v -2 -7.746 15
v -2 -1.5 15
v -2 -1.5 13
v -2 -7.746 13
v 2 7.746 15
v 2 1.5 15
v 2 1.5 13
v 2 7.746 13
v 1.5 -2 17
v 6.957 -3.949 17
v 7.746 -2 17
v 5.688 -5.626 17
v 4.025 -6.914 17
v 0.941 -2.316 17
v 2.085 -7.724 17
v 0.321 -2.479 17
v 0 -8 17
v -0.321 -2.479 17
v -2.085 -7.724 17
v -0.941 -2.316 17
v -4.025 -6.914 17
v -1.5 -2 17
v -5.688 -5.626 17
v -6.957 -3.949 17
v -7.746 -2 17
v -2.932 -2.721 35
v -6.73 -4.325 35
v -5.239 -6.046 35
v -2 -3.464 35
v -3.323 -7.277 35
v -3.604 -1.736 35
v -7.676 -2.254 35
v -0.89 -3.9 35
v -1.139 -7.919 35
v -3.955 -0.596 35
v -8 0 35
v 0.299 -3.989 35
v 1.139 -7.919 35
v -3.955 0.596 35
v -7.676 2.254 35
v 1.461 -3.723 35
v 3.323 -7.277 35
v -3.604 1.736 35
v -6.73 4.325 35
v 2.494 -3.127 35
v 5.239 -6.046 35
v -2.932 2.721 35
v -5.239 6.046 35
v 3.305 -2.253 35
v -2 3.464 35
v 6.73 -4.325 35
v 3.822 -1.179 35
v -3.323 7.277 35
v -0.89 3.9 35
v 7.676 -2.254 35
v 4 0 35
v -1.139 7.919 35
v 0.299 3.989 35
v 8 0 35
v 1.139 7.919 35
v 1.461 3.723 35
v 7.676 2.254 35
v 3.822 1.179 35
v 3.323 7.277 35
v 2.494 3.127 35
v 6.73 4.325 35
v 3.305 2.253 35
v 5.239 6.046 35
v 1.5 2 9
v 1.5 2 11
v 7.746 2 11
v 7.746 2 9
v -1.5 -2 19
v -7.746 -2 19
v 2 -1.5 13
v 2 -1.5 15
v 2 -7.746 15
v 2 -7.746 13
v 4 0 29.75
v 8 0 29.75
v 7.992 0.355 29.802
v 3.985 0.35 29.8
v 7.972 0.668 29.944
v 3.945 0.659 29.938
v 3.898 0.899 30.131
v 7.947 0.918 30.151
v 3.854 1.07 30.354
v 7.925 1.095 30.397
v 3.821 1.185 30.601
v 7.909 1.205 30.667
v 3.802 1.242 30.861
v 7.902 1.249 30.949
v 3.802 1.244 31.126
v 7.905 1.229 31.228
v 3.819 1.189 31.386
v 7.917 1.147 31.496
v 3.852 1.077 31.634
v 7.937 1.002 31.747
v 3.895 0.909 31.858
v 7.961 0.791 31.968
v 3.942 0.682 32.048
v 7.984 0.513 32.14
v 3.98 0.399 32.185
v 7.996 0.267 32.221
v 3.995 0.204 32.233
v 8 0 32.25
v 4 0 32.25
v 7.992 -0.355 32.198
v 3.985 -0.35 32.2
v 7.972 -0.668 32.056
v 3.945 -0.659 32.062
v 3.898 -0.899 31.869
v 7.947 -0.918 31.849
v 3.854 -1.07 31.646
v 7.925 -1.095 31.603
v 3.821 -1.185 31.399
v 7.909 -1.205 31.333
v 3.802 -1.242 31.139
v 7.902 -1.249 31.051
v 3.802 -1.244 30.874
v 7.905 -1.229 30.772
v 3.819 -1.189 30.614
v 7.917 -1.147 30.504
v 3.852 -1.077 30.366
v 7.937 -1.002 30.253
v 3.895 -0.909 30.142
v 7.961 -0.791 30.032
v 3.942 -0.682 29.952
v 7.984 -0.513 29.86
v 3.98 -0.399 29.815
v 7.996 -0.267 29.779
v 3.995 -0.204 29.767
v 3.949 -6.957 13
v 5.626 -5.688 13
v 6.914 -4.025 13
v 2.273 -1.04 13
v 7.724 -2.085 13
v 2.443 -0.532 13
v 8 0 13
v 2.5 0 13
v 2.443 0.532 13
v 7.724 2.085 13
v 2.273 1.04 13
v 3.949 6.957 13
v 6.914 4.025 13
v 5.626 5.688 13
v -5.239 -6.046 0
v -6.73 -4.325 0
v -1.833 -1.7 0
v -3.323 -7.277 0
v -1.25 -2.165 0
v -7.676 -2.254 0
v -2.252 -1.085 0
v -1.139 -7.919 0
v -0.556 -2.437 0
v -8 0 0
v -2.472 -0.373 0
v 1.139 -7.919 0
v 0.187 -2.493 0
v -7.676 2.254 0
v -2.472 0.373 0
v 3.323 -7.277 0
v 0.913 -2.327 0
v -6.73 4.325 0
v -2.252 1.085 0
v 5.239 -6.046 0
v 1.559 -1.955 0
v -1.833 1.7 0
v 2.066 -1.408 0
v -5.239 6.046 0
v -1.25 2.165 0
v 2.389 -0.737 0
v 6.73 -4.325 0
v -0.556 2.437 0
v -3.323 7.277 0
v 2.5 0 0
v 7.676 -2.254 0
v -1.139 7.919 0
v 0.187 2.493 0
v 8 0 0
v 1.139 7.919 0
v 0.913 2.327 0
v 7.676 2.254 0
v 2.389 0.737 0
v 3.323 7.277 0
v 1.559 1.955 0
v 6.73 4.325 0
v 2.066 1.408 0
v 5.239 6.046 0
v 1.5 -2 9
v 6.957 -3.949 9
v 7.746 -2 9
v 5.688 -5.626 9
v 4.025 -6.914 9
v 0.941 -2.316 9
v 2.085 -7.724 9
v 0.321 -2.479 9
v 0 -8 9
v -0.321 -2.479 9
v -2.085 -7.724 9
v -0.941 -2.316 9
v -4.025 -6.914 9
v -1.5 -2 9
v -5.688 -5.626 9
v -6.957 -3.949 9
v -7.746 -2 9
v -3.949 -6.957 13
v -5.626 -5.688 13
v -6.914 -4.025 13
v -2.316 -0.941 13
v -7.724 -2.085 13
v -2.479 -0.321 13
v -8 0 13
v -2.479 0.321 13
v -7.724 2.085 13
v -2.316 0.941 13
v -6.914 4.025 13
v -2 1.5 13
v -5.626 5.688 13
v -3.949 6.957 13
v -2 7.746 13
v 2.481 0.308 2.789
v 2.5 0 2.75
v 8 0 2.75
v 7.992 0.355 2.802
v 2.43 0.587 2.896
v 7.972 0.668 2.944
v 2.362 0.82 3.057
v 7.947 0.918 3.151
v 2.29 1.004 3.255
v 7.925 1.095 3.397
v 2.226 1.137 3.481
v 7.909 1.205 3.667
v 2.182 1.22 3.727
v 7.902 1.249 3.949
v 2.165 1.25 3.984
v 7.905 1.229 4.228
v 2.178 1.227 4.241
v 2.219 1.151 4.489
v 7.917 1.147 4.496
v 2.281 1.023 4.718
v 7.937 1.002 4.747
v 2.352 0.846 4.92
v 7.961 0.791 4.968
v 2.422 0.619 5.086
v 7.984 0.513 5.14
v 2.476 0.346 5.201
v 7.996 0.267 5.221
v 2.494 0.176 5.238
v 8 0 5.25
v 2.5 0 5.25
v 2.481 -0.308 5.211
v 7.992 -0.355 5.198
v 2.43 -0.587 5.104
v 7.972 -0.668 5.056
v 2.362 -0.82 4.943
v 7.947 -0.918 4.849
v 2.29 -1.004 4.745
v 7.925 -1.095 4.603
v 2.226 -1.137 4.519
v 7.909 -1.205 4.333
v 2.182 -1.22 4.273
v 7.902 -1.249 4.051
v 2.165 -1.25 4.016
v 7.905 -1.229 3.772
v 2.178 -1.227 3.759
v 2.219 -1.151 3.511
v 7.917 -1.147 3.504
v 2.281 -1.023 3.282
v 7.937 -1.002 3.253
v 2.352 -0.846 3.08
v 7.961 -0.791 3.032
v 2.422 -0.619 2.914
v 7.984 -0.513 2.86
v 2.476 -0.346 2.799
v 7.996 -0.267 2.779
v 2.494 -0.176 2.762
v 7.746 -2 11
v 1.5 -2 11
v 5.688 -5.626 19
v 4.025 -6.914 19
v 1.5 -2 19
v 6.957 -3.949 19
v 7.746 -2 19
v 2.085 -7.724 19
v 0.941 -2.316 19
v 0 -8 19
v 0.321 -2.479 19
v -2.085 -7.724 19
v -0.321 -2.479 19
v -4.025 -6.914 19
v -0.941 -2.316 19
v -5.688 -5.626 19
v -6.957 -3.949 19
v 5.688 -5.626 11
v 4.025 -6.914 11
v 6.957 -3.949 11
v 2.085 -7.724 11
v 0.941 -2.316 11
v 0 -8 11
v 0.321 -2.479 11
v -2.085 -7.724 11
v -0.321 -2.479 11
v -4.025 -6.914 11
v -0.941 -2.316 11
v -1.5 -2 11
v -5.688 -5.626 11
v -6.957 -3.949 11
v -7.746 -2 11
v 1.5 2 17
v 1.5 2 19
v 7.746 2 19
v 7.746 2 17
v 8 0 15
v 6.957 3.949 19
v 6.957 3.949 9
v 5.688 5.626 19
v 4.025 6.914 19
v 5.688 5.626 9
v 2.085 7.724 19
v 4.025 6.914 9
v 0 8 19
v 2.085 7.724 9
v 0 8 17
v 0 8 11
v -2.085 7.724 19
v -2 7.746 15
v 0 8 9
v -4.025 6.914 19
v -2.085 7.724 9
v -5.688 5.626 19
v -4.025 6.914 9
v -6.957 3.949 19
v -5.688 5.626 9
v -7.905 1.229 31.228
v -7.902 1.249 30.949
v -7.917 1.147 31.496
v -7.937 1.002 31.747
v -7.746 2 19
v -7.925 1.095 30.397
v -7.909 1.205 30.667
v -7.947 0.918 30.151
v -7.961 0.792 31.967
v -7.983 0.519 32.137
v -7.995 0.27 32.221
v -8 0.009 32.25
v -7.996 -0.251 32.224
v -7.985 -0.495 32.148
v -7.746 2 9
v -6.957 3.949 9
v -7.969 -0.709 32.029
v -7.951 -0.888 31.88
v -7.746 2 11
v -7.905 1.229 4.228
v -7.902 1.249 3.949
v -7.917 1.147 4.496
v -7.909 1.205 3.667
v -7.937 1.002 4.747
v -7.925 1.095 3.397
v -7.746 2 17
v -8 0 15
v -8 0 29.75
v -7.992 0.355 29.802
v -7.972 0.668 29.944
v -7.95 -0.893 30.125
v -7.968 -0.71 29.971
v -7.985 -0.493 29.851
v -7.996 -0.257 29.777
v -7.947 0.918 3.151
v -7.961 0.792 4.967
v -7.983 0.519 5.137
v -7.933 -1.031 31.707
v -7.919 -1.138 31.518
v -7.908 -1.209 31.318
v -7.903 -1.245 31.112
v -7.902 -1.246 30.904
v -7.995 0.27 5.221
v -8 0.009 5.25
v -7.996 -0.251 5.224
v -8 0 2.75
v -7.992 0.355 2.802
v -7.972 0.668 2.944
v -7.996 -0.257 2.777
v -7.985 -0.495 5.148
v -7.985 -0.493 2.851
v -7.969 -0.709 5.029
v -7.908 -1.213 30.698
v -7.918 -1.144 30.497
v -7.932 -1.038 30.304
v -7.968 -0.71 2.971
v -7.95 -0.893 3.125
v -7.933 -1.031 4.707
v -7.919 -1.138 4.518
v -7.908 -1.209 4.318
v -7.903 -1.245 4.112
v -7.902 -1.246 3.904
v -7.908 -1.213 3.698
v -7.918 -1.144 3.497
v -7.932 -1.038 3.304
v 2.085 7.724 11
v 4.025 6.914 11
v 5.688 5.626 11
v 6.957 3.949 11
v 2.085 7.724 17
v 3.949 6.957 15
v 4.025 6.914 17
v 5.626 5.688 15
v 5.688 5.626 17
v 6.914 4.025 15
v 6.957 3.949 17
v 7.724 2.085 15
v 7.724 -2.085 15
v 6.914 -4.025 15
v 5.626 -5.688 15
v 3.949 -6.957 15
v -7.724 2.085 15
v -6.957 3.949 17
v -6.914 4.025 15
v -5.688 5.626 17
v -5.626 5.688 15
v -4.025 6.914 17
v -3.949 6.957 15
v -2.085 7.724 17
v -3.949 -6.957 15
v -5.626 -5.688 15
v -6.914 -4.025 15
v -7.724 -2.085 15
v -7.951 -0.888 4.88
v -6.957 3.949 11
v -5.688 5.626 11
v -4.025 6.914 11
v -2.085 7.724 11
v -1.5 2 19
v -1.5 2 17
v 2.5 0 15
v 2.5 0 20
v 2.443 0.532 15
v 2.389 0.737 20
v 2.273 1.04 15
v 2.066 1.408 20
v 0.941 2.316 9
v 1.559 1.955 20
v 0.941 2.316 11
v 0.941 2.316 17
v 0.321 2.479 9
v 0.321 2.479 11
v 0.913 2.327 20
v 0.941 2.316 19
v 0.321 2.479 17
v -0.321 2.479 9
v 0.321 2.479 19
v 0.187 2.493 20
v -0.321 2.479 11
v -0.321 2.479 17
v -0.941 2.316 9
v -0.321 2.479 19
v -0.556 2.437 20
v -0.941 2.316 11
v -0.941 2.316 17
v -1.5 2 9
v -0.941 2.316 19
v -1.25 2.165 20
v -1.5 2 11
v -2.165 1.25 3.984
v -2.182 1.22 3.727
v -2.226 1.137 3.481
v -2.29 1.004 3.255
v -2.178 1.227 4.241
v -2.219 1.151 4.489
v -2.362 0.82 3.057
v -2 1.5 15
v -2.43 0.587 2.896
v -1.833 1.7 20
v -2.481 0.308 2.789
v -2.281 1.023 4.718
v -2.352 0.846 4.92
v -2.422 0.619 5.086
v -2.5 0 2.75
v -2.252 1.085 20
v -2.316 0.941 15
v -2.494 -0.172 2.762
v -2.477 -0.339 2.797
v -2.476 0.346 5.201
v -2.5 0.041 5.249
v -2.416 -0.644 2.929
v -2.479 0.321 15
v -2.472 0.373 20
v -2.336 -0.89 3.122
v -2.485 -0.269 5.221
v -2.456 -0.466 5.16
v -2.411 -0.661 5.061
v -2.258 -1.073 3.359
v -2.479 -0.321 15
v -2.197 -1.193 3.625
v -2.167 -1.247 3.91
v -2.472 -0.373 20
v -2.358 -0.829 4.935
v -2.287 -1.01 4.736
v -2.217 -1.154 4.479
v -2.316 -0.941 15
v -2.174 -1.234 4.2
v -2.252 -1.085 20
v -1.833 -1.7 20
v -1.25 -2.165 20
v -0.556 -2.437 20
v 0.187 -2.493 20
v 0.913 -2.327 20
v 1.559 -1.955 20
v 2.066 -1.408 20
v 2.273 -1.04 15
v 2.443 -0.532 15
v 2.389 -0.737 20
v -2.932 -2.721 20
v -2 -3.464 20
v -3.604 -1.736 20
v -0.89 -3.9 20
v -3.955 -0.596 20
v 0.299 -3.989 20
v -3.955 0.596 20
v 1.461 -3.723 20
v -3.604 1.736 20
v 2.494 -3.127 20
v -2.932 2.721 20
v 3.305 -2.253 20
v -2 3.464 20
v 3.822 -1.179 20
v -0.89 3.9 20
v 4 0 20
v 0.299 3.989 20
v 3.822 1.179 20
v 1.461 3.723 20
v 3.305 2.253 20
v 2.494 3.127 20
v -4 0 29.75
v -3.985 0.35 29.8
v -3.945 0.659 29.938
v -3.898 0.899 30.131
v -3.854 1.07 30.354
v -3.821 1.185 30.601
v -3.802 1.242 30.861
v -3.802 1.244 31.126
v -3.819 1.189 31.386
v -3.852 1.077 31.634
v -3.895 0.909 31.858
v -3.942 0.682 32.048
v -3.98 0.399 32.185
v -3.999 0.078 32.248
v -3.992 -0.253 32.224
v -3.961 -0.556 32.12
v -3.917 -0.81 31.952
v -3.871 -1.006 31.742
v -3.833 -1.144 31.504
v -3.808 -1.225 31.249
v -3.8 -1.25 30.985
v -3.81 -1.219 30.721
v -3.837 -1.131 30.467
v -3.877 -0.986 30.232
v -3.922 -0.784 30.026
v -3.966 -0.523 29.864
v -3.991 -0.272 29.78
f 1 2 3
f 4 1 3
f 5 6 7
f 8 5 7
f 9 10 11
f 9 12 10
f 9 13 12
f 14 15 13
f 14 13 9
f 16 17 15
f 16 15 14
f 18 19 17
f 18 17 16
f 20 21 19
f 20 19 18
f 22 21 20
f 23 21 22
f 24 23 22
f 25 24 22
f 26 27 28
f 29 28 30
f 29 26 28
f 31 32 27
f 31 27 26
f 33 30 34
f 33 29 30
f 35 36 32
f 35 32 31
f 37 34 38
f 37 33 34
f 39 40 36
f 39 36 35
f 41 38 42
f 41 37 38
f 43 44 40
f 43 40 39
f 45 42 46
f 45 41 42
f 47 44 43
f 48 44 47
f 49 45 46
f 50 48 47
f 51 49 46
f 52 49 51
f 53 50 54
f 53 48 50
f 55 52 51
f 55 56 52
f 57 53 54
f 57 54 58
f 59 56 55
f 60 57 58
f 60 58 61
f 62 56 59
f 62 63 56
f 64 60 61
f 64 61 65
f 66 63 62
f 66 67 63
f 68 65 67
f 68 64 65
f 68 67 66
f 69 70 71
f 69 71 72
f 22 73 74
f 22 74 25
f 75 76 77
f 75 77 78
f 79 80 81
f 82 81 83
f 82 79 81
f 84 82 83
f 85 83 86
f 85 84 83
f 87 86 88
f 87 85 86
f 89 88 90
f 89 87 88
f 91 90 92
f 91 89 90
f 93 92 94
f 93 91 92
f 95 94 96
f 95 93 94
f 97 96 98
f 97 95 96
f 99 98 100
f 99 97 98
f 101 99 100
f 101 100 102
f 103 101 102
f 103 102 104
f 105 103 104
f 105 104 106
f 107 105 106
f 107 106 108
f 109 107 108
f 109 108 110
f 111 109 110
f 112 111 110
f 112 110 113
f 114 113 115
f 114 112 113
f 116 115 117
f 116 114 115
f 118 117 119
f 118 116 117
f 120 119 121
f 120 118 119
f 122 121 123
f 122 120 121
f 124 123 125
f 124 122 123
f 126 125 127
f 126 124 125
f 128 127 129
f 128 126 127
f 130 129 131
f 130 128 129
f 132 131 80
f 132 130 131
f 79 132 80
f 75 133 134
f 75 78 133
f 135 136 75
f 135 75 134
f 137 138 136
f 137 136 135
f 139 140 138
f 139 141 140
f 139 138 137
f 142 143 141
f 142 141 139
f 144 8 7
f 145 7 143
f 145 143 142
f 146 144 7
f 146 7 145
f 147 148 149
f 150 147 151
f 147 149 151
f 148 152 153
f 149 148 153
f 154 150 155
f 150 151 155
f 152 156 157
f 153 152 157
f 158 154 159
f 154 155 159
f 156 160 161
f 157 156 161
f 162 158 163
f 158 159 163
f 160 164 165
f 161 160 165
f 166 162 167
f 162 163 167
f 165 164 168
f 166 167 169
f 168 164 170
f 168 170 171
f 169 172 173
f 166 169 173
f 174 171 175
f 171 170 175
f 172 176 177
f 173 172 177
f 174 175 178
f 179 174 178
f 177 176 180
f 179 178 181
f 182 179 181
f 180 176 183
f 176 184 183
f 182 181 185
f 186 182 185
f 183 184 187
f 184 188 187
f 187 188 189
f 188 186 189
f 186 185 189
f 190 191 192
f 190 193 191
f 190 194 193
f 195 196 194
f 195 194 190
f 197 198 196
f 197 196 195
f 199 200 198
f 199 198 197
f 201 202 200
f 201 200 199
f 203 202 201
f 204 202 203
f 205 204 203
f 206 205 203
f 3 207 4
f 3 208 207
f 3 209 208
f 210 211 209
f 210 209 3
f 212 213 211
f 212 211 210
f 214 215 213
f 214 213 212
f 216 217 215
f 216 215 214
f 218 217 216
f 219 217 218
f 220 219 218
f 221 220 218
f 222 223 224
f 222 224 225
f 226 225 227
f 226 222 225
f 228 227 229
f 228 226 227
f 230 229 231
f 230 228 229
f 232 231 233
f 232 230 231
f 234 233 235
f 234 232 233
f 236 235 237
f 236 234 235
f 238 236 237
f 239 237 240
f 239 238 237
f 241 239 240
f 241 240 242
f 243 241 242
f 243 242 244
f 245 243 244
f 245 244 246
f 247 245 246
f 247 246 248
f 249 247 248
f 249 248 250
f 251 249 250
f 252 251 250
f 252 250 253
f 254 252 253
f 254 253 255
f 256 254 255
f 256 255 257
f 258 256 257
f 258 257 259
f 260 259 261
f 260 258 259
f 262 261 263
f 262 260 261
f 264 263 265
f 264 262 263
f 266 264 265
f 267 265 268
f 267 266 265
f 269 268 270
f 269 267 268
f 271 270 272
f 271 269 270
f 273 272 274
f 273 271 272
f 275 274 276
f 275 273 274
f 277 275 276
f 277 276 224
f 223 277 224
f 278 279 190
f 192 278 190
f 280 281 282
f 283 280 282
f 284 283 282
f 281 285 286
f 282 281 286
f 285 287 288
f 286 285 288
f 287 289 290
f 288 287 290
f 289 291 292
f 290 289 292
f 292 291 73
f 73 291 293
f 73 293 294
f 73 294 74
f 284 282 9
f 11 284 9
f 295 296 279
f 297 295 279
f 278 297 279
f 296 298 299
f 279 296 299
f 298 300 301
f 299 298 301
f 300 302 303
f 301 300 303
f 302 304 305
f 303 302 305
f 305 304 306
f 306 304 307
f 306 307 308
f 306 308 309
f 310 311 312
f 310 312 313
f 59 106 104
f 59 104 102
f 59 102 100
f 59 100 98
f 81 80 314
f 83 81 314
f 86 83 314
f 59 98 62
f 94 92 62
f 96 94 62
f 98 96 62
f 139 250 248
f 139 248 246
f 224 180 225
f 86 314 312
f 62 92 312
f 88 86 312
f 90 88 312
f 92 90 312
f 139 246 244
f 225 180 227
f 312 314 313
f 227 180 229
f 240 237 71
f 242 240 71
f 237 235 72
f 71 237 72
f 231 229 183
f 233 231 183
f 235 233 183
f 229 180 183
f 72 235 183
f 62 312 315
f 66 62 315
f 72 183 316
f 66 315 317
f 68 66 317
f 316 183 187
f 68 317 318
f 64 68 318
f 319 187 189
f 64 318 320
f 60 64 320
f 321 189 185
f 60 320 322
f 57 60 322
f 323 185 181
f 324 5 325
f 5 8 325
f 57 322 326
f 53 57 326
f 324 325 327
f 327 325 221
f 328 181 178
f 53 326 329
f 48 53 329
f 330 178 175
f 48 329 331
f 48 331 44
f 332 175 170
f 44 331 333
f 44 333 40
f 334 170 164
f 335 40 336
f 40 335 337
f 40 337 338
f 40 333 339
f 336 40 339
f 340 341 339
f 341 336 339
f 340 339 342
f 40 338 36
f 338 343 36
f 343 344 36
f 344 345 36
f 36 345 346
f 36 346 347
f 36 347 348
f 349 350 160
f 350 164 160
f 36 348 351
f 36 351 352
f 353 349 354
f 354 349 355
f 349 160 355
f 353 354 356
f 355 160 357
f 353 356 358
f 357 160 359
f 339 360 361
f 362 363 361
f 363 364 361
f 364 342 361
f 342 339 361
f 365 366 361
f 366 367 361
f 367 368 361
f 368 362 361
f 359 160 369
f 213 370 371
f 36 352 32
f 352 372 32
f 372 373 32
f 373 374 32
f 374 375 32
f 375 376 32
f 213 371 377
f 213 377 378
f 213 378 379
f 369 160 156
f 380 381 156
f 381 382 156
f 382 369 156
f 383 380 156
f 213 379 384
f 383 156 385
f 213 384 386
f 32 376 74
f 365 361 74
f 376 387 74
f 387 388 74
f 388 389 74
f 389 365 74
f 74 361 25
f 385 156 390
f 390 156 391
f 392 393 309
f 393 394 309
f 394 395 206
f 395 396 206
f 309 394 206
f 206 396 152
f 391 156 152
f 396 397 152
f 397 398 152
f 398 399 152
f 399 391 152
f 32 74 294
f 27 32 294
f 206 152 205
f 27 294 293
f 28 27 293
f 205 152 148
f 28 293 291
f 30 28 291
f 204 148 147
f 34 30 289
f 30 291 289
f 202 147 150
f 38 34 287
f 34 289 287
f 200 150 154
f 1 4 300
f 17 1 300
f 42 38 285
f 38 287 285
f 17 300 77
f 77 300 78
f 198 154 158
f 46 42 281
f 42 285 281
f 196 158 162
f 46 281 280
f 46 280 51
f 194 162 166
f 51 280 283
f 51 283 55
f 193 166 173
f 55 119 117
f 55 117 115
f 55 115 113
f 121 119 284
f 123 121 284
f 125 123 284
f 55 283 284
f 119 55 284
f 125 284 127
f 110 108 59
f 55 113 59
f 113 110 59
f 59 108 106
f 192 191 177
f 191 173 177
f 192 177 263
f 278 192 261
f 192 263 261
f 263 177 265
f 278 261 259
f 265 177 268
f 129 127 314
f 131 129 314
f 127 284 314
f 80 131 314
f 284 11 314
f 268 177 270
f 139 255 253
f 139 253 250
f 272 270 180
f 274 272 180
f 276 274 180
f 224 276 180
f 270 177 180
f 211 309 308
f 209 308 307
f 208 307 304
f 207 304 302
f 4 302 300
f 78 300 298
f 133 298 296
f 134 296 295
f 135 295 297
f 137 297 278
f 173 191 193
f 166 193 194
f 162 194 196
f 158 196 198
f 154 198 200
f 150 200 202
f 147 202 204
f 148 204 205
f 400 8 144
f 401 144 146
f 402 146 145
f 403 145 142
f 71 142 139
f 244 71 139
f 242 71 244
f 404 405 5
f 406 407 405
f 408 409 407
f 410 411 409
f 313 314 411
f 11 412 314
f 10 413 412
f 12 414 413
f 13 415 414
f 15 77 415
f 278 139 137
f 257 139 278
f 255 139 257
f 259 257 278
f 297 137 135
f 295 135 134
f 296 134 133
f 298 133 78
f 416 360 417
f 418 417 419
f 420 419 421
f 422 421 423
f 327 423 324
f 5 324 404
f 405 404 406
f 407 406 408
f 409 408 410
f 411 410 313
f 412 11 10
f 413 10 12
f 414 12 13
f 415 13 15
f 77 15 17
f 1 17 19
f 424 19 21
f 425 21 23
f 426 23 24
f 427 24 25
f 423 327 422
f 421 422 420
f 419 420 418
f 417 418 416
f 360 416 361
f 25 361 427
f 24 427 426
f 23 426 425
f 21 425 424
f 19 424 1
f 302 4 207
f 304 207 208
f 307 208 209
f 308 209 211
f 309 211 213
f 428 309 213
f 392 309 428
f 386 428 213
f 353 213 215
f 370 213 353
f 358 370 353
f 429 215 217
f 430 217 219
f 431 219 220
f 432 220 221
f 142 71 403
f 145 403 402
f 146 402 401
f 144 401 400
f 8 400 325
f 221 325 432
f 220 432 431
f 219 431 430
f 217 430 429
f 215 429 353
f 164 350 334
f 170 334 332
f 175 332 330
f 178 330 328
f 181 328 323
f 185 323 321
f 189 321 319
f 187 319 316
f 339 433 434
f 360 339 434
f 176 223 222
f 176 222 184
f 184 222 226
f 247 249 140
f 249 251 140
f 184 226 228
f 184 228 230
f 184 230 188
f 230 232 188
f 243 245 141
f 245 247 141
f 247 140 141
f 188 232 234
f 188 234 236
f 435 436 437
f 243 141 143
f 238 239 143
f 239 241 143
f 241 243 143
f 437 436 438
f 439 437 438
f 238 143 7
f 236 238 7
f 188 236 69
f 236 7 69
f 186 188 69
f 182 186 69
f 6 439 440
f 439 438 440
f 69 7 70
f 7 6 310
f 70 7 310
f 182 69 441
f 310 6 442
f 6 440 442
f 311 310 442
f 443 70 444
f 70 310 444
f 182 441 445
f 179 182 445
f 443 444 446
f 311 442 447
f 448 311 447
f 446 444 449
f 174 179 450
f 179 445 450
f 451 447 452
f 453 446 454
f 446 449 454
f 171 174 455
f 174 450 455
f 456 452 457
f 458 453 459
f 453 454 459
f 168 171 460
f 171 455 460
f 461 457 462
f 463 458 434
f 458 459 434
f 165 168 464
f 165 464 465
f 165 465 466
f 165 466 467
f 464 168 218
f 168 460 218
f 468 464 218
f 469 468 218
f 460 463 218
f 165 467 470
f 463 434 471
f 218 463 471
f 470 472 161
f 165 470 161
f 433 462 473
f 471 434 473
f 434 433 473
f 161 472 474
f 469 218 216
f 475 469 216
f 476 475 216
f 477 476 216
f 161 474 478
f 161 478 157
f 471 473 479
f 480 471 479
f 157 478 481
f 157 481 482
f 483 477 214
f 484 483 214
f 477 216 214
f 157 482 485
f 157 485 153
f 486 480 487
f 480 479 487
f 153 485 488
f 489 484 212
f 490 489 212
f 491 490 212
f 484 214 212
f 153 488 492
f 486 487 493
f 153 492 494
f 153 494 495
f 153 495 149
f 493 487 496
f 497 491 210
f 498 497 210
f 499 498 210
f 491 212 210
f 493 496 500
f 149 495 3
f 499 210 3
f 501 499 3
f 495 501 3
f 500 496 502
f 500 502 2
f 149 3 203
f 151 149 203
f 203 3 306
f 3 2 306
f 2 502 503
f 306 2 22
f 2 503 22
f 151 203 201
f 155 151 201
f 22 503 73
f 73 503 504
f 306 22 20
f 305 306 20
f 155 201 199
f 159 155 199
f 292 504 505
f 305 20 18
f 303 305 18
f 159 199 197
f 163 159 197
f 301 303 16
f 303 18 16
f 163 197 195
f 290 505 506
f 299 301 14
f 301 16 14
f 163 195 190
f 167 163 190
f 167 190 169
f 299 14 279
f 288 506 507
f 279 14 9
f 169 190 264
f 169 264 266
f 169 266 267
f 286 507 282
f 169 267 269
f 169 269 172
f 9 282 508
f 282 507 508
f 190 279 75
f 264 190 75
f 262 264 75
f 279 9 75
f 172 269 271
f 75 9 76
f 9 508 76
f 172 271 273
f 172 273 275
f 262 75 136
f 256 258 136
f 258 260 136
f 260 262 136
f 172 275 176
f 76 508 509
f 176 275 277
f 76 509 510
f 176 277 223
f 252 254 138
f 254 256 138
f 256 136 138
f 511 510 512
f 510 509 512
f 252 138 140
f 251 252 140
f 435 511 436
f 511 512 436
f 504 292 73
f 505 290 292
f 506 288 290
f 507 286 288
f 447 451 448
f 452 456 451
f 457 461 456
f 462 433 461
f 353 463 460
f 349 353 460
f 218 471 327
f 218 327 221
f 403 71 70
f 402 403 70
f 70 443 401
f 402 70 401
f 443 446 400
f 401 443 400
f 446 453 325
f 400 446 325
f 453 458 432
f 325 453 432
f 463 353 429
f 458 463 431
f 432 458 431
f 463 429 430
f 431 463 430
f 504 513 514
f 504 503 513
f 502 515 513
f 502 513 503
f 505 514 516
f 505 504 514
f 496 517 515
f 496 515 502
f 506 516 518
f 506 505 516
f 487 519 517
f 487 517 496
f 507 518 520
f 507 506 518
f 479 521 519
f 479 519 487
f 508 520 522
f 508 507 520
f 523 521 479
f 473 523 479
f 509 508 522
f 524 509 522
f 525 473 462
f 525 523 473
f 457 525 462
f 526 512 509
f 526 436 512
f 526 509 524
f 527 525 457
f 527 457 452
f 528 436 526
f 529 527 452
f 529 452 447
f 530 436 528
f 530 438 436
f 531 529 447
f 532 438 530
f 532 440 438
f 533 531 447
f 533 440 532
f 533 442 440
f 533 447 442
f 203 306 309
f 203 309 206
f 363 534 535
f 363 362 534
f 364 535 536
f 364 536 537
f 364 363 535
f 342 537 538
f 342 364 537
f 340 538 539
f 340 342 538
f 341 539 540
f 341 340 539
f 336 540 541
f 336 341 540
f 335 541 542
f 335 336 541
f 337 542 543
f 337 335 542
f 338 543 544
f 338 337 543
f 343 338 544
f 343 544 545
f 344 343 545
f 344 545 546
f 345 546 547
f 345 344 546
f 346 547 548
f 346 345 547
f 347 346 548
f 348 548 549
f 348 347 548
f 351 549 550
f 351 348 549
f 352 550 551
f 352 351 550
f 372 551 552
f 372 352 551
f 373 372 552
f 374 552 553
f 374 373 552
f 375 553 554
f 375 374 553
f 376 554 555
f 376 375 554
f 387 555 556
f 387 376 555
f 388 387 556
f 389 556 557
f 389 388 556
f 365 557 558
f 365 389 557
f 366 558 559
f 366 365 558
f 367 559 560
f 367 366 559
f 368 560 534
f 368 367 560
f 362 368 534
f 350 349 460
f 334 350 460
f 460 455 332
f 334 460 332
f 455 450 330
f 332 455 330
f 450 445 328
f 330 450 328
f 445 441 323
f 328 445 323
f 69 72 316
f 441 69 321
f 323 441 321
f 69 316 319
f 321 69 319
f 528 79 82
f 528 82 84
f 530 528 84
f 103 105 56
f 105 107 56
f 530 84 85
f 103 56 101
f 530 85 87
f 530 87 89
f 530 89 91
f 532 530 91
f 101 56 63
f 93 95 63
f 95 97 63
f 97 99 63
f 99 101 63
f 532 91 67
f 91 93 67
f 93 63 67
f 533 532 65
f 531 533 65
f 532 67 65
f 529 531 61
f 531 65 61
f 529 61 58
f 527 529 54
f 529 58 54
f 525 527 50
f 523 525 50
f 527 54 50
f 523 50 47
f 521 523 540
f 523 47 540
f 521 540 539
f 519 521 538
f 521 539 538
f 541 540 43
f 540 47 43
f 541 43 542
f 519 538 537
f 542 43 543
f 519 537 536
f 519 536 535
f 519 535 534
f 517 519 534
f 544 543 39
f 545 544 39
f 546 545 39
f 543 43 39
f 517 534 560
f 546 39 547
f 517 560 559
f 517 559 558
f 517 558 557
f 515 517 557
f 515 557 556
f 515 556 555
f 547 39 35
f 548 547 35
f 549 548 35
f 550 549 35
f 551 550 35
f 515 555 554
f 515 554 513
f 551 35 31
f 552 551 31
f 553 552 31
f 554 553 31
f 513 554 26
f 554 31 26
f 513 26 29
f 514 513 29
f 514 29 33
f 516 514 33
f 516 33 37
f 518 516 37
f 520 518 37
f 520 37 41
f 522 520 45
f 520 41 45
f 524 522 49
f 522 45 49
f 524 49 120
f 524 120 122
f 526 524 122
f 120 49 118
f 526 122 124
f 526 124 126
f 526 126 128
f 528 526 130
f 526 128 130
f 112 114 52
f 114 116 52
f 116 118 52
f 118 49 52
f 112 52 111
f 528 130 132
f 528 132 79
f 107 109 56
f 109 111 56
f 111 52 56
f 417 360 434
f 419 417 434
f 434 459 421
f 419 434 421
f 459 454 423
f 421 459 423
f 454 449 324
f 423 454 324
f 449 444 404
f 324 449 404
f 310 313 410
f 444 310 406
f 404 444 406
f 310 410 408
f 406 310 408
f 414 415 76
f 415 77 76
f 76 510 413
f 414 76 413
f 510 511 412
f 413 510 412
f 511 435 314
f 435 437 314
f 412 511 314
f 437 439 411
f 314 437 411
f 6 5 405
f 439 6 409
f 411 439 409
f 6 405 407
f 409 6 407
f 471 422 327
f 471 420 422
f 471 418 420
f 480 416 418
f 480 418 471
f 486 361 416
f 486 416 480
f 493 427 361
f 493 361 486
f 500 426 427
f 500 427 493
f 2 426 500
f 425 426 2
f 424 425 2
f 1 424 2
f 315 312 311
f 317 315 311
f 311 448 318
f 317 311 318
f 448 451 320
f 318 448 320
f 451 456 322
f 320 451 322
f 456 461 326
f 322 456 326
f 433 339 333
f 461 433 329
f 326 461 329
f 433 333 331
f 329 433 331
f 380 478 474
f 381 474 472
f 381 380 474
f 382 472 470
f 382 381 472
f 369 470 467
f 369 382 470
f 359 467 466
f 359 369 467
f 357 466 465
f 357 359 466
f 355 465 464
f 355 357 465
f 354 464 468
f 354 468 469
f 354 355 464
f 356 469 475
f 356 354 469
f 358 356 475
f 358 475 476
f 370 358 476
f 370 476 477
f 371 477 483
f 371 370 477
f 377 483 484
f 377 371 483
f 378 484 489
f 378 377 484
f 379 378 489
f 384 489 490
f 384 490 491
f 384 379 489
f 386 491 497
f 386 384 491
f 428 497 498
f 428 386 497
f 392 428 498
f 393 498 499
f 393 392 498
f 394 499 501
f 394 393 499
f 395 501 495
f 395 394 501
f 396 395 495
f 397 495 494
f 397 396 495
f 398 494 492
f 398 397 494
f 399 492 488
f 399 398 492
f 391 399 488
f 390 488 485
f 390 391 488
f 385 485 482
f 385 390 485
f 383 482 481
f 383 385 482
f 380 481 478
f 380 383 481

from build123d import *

# Parameters (mm, degrees)
SCHIZZO1_R                           = 8
ESTRUSIONE_ESTRUSIONE1_DEPTH         = 35
SCHIZZO2_R                           = 2.5
TAGLIO_ESTRUSIONE1_DEPTH             = 37.783148315
SCHIZZO3_R                           = 4
TAGLIO_ESTRUSIONE2_DEPTH             = 15
TAGLIO_ESTRUSIONE3_DEPTH             = 37.783148315
TAGLIO_ESTRUSIONE3_DEPTH_BACK        = 37.783148315
SCHIZZO4_R                           = 1.25
TAGLIO_ESTRUSIONE8_REACH             = 38.783
SCHIZZO13_W                          = 2
SCHIZZO13_H                          = 6
TAGLIO_ESTRUSIONE8_DIRECTION_2_REACH = 38.783
TAGLIO_ESTRUSIONE9_REACH             = 38.783
SCHIZZO14_W                          = 6
SCHIZZO14_H                          = 2
TAGLIO_ESTRUSIONE9_DIRECTION_2_REACH = 38.783


with BuildPart() as part:
    # Schizzo1 → Estrusione-Estrusione1 (new body)
    with BuildSketch(Plane.XY):
        Circle(SCHIZZO1_R)
    extrude(amount=ESTRUSIONE_ESTRUSIONE1_DEPTH)

    # Schizzo2 → Taglio-Estrusione1 (cut, through all)
    with BuildSketch(Plane.XY.offset(35)):
        Circle(SCHIZZO2_R)
    extrude(amount=-TAGLIO_ESTRUSIONE1_DEPTH, mode=Mode.SUBTRACT)

    # Schizzo3 → Taglio-Estrusione2 (cut)
    with BuildSketch(Plane.XY.offset(35)):
        Circle(SCHIZZO3_R)
    extrude(amount=-TAGLIO_ESTRUSIONE2_DEPTH, mode=Mode.SUBTRACT)

    # Schizzo4 → Taglio-Estrusione3 (cut, two sides: drawn at the far end of the back side and taken through both)
    with BuildSketch(Plane(origin=(0, 0, 0), x_dir=(0, 0, -1), z_dir=(1, 0, 0)).offset(-TAGLIO_ESTRUSIONE3_DEPTH_BACK)):
        with Locations((-31, 0)):
            Circle(SCHIZZO4_R)
        with Locations((-4, 0)):
            Circle(SCHIZZO4_R)
    extrude(amount=TAGLIO_ESTRUSIONE3_DEPTH + TAGLIO_ESTRUSIONE3_DEPTH_BACK, mode=Mode.SUBTRACT)

    # Schizzo13 → Taglio-Estrusione8 (cut, up to next)
    with BuildSketch(Plane(origin=(0, 0, 0), x_dir=(0, 0, -1), z_dir=(1, 0, 0)), mode=Mode.PRIVATE) as taglio_estrusione8_sk1:
        with Locations((-18, 5)):
            Rectangle(SCHIZZO13_W, SCHIZZO13_H)
    taglio_estrusione8_tool1 = extrude(taglio_estrusione8_sk1.sketch, amount=-TAGLIO_ESTRUSIONE8_REACH, mode=Mode.PRIVATE) & part.part
    # Schizzo13 → Taglio-Estrusione8 (cut, up to next)
    with BuildSketch(Plane(origin=(0, 0, 0), x_dir=(0, 0, -1), z_dir=(1, 0, 0)), mode=Mode.PRIVATE) as taglio_estrusione8_sk2:
        with Locations((-10, 5)):
            Rectangle(SCHIZZO13_W, SCHIZZO13_H)
    taglio_estrusione8_tool2 = extrude(taglio_estrusione8_sk2.sketch, amount=-TAGLIO_ESTRUSIONE8_REACH, mode=Mode.PRIVATE) & part.part
    # Schizzo13 → Taglio-Estrusione8 (cut, up to next)
    with BuildSketch(Plane(origin=(0, 0, 0), x_dir=(0, 0, -1), z_dir=(1, 0, 0)), mode=Mode.PRIVATE) as taglio_estrusione8_sk3:
        with Locations((-18, -5)):
            Rectangle(SCHIZZO13_W, SCHIZZO13_H)
    taglio_estrusione8_tool3 = extrude(taglio_estrusione8_sk3.sketch, amount=-TAGLIO_ESTRUSIONE8_REACH, mode=Mode.PRIVATE) & part.part
    # Schizzo13 → Taglio-Estrusione8 (cut, up to next)
    with BuildSketch(Plane(origin=(0, 0, 0), x_dir=(0, 0, -1), z_dir=(1, 0, 0)), mode=Mode.PRIVATE) as taglio_estrusione8_sk4:
        with Locations((-10, -5)):
            Rectangle(SCHIZZO13_W, SCHIZZO13_H)
    taglio_estrusione8_tool4 = extrude(taglio_estrusione8_sk4.sketch, amount=-TAGLIO_ESTRUSIONE8_REACH, mode=Mode.PRIVATE) & part.part
    add(taglio_estrusione8_tool1.solids().sort_by_distance((0, 5, 18))[0], mode=Mode.SUBTRACT)
    add(taglio_estrusione8_tool2.solids().sort_by_distance((0, 5, 10))[0], mode=Mode.SUBTRACT)
    add(taglio_estrusione8_tool3.solids().sort_by_distance((0, -5, 18))[0], mode=Mode.SUBTRACT)
    add(taglio_estrusione8_tool4.solids().sort_by_distance((0, -5, 10))[0], mode=Mode.SUBTRACT)

    # Schizzo13 → Taglio-Estrusione8 direction 2 (cut, up to next)
    with BuildSketch(Plane(origin=(0, 0, 0), x_dir=(0, 0, -1), z_dir=(1, 0, 0)), mode=Mode.PRIVATE) as taglio_estrusione8_direction_2_sk1:
        with Locations((-18, 5)):
            Rectangle(SCHIZZO13_W, SCHIZZO13_H)
    taglio_estrusione8_direction_2_tool1 = extrude(taglio_estrusione8_direction_2_sk1.sketch, amount=TAGLIO_ESTRUSIONE8_DIRECTION_2_REACH, mode=Mode.PRIVATE) & part.part
    # Schizzo13 → Taglio-Estrusione8 direction 2 (cut, up to next)
    with BuildSketch(Plane(origin=(0, 0, 0), x_dir=(0, 0, -1), z_dir=(1, 0, 0)), mode=Mode.PRIVATE) as taglio_estrusione8_direction_2_sk2:
        with Locations((-10, 5)):
            Rectangle(SCHIZZO13_W, SCHIZZO13_H)
    taglio_estrusione8_direction_2_tool2 = extrude(taglio_estrusione8_direction_2_sk2.sketch, amount=TAGLIO_ESTRUSIONE8_DIRECTION_2_REACH, mode=Mode.PRIVATE) & part.part
    # Schizzo13 → Taglio-Estrusione8 direction 2 (cut, up to next)
    with BuildSketch(Plane(origin=(0, 0, 0), x_dir=(0, 0, -1), z_dir=(1, 0, 0)), mode=Mode.PRIVATE) as taglio_estrusione8_direction_2_sk3:
        with Locations((-18, -5)):
            Rectangle(SCHIZZO13_W, SCHIZZO13_H)
    taglio_estrusione8_direction_2_tool3 = extrude(taglio_estrusione8_direction_2_sk3.sketch, amount=TAGLIO_ESTRUSIONE8_DIRECTION_2_REACH, mode=Mode.PRIVATE) & part.part
    # Schizzo13 → Taglio-Estrusione8 direction 2 (cut, up to next)
    with BuildSketch(Plane(origin=(0, 0, 0), x_dir=(0, 0, -1), z_dir=(1, 0, 0)), mode=Mode.PRIVATE) as taglio_estrusione8_direction_2_sk4:
        with Locations((-10, -5)):
            Rectangle(SCHIZZO13_W, SCHIZZO13_H)
    taglio_estrusione8_direction_2_tool4 = extrude(taglio_estrusione8_direction_2_sk4.sketch, amount=TAGLIO_ESTRUSIONE8_DIRECTION_2_REACH, mode=Mode.PRIVATE) & part.part
    add(taglio_estrusione8_direction_2_tool1.solids().sort_by_distance((0, 5, 18))[0], mode=Mode.SUBTRACT)
    add(taglio_estrusione8_direction_2_tool2.solids().sort_by_distance((0, 5, 10))[0], mode=Mode.SUBTRACT)
    add(taglio_estrusione8_direction_2_tool3.solids().sort_by_distance((0, -5, 18))[0], mode=Mode.SUBTRACT)
    add(taglio_estrusione8_direction_2_tool4.solids().sort_by_distance((0, -5, 10))[0], mode=Mode.SUBTRACT)

    # Schizzo14 → Taglio-Estrusione9 (cut, up to next)
    with BuildSketch(Plane(origin=(0, 0, 0), x_dir=(1, 0, 0), z_dir=(0, 1, 0)), mode=Mode.PRIVATE) as taglio_estrusione9_sk1:
        with Locations((-5, -14)):
            Rectangle(SCHIZZO14_W, SCHIZZO14_H)
    taglio_estrusione9_tool1 = extrude(taglio_estrusione9_sk1.sketch, amount=-TAGLIO_ESTRUSIONE9_REACH, mode=Mode.PRIVATE) & part.part
    # Schizzo14 → Taglio-Estrusione9 (cut, up to next)
    with BuildSketch(Plane(origin=(0, 0, 0), x_dir=(1, 0, 0), z_dir=(0, 1, 0)), mode=Mode.PRIVATE) as taglio_estrusione9_sk2:
        with Locations((5, -14)):
            Rectangle(SCHIZZO14_W, SCHIZZO14_H)
    taglio_estrusione9_tool2 = extrude(taglio_estrusione9_sk2.sketch, amount=-TAGLIO_ESTRUSIONE9_REACH, mode=Mode.PRIVATE) & part.part
    add(taglio_estrusione9_tool1.solids().sort_by_distance((-5, 0, 14))[0], mode=Mode.SUBTRACT)
    add(taglio_estrusione9_tool2.solids().sort_by_distance((5, 0, 14))[0], mode=Mode.SUBTRACT)

    # Schizzo14 → Taglio-Estrusione9 direction 2 (cut, up to next)
    with BuildSketch(Plane(origin=(0, 0, 0), x_dir=(1, 0, 0), z_dir=(0, 1, 0)), mode=Mode.PRIVATE) as taglio_estrusione9_direction_2_sk1:
        with Locations((-5, -14)):
            Rectangle(SCHIZZO14_W, SCHIZZO14_H)
    taglio_estrusione9_direction_2_tool1 = extrude(taglio_estrusione9_direction_2_sk1.sketch, amount=TAGLIO_ESTRUSIONE9_DIRECTION_2_REACH, mode=Mode.PRIVATE) & part.part
    # Schizzo14 → Taglio-Estrusione9 direction 2 (cut, up to next)
    with BuildSketch(Plane(origin=(0, 0, 0), x_dir=(1, 0, 0), z_dir=(0, 1, 0)), mode=Mode.PRIVATE) as taglio_estrusione9_direction_2_sk2:
        with Locations((5, -14)):
            Rectangle(SCHIZZO14_W, SCHIZZO14_H)
    taglio_estrusione9_direction_2_tool2 = extrude(taglio_estrusione9_direction_2_sk2.sketch, amount=TAGLIO_ESTRUSIONE9_DIRECTION_2_REACH, mode=Mode.PRIVATE) & part.part
    add(taglio_estrusione9_direction_2_tool1.solids().sort_by_distance((-5, 0, 14))[0], mode=Mode.SUBTRACT)
    add(taglio_estrusione9_direction_2_tool2.solids().sort_by_distance((5, 0, 14))[0], mode=Mode.SUBTRACT)


solid = part.part
